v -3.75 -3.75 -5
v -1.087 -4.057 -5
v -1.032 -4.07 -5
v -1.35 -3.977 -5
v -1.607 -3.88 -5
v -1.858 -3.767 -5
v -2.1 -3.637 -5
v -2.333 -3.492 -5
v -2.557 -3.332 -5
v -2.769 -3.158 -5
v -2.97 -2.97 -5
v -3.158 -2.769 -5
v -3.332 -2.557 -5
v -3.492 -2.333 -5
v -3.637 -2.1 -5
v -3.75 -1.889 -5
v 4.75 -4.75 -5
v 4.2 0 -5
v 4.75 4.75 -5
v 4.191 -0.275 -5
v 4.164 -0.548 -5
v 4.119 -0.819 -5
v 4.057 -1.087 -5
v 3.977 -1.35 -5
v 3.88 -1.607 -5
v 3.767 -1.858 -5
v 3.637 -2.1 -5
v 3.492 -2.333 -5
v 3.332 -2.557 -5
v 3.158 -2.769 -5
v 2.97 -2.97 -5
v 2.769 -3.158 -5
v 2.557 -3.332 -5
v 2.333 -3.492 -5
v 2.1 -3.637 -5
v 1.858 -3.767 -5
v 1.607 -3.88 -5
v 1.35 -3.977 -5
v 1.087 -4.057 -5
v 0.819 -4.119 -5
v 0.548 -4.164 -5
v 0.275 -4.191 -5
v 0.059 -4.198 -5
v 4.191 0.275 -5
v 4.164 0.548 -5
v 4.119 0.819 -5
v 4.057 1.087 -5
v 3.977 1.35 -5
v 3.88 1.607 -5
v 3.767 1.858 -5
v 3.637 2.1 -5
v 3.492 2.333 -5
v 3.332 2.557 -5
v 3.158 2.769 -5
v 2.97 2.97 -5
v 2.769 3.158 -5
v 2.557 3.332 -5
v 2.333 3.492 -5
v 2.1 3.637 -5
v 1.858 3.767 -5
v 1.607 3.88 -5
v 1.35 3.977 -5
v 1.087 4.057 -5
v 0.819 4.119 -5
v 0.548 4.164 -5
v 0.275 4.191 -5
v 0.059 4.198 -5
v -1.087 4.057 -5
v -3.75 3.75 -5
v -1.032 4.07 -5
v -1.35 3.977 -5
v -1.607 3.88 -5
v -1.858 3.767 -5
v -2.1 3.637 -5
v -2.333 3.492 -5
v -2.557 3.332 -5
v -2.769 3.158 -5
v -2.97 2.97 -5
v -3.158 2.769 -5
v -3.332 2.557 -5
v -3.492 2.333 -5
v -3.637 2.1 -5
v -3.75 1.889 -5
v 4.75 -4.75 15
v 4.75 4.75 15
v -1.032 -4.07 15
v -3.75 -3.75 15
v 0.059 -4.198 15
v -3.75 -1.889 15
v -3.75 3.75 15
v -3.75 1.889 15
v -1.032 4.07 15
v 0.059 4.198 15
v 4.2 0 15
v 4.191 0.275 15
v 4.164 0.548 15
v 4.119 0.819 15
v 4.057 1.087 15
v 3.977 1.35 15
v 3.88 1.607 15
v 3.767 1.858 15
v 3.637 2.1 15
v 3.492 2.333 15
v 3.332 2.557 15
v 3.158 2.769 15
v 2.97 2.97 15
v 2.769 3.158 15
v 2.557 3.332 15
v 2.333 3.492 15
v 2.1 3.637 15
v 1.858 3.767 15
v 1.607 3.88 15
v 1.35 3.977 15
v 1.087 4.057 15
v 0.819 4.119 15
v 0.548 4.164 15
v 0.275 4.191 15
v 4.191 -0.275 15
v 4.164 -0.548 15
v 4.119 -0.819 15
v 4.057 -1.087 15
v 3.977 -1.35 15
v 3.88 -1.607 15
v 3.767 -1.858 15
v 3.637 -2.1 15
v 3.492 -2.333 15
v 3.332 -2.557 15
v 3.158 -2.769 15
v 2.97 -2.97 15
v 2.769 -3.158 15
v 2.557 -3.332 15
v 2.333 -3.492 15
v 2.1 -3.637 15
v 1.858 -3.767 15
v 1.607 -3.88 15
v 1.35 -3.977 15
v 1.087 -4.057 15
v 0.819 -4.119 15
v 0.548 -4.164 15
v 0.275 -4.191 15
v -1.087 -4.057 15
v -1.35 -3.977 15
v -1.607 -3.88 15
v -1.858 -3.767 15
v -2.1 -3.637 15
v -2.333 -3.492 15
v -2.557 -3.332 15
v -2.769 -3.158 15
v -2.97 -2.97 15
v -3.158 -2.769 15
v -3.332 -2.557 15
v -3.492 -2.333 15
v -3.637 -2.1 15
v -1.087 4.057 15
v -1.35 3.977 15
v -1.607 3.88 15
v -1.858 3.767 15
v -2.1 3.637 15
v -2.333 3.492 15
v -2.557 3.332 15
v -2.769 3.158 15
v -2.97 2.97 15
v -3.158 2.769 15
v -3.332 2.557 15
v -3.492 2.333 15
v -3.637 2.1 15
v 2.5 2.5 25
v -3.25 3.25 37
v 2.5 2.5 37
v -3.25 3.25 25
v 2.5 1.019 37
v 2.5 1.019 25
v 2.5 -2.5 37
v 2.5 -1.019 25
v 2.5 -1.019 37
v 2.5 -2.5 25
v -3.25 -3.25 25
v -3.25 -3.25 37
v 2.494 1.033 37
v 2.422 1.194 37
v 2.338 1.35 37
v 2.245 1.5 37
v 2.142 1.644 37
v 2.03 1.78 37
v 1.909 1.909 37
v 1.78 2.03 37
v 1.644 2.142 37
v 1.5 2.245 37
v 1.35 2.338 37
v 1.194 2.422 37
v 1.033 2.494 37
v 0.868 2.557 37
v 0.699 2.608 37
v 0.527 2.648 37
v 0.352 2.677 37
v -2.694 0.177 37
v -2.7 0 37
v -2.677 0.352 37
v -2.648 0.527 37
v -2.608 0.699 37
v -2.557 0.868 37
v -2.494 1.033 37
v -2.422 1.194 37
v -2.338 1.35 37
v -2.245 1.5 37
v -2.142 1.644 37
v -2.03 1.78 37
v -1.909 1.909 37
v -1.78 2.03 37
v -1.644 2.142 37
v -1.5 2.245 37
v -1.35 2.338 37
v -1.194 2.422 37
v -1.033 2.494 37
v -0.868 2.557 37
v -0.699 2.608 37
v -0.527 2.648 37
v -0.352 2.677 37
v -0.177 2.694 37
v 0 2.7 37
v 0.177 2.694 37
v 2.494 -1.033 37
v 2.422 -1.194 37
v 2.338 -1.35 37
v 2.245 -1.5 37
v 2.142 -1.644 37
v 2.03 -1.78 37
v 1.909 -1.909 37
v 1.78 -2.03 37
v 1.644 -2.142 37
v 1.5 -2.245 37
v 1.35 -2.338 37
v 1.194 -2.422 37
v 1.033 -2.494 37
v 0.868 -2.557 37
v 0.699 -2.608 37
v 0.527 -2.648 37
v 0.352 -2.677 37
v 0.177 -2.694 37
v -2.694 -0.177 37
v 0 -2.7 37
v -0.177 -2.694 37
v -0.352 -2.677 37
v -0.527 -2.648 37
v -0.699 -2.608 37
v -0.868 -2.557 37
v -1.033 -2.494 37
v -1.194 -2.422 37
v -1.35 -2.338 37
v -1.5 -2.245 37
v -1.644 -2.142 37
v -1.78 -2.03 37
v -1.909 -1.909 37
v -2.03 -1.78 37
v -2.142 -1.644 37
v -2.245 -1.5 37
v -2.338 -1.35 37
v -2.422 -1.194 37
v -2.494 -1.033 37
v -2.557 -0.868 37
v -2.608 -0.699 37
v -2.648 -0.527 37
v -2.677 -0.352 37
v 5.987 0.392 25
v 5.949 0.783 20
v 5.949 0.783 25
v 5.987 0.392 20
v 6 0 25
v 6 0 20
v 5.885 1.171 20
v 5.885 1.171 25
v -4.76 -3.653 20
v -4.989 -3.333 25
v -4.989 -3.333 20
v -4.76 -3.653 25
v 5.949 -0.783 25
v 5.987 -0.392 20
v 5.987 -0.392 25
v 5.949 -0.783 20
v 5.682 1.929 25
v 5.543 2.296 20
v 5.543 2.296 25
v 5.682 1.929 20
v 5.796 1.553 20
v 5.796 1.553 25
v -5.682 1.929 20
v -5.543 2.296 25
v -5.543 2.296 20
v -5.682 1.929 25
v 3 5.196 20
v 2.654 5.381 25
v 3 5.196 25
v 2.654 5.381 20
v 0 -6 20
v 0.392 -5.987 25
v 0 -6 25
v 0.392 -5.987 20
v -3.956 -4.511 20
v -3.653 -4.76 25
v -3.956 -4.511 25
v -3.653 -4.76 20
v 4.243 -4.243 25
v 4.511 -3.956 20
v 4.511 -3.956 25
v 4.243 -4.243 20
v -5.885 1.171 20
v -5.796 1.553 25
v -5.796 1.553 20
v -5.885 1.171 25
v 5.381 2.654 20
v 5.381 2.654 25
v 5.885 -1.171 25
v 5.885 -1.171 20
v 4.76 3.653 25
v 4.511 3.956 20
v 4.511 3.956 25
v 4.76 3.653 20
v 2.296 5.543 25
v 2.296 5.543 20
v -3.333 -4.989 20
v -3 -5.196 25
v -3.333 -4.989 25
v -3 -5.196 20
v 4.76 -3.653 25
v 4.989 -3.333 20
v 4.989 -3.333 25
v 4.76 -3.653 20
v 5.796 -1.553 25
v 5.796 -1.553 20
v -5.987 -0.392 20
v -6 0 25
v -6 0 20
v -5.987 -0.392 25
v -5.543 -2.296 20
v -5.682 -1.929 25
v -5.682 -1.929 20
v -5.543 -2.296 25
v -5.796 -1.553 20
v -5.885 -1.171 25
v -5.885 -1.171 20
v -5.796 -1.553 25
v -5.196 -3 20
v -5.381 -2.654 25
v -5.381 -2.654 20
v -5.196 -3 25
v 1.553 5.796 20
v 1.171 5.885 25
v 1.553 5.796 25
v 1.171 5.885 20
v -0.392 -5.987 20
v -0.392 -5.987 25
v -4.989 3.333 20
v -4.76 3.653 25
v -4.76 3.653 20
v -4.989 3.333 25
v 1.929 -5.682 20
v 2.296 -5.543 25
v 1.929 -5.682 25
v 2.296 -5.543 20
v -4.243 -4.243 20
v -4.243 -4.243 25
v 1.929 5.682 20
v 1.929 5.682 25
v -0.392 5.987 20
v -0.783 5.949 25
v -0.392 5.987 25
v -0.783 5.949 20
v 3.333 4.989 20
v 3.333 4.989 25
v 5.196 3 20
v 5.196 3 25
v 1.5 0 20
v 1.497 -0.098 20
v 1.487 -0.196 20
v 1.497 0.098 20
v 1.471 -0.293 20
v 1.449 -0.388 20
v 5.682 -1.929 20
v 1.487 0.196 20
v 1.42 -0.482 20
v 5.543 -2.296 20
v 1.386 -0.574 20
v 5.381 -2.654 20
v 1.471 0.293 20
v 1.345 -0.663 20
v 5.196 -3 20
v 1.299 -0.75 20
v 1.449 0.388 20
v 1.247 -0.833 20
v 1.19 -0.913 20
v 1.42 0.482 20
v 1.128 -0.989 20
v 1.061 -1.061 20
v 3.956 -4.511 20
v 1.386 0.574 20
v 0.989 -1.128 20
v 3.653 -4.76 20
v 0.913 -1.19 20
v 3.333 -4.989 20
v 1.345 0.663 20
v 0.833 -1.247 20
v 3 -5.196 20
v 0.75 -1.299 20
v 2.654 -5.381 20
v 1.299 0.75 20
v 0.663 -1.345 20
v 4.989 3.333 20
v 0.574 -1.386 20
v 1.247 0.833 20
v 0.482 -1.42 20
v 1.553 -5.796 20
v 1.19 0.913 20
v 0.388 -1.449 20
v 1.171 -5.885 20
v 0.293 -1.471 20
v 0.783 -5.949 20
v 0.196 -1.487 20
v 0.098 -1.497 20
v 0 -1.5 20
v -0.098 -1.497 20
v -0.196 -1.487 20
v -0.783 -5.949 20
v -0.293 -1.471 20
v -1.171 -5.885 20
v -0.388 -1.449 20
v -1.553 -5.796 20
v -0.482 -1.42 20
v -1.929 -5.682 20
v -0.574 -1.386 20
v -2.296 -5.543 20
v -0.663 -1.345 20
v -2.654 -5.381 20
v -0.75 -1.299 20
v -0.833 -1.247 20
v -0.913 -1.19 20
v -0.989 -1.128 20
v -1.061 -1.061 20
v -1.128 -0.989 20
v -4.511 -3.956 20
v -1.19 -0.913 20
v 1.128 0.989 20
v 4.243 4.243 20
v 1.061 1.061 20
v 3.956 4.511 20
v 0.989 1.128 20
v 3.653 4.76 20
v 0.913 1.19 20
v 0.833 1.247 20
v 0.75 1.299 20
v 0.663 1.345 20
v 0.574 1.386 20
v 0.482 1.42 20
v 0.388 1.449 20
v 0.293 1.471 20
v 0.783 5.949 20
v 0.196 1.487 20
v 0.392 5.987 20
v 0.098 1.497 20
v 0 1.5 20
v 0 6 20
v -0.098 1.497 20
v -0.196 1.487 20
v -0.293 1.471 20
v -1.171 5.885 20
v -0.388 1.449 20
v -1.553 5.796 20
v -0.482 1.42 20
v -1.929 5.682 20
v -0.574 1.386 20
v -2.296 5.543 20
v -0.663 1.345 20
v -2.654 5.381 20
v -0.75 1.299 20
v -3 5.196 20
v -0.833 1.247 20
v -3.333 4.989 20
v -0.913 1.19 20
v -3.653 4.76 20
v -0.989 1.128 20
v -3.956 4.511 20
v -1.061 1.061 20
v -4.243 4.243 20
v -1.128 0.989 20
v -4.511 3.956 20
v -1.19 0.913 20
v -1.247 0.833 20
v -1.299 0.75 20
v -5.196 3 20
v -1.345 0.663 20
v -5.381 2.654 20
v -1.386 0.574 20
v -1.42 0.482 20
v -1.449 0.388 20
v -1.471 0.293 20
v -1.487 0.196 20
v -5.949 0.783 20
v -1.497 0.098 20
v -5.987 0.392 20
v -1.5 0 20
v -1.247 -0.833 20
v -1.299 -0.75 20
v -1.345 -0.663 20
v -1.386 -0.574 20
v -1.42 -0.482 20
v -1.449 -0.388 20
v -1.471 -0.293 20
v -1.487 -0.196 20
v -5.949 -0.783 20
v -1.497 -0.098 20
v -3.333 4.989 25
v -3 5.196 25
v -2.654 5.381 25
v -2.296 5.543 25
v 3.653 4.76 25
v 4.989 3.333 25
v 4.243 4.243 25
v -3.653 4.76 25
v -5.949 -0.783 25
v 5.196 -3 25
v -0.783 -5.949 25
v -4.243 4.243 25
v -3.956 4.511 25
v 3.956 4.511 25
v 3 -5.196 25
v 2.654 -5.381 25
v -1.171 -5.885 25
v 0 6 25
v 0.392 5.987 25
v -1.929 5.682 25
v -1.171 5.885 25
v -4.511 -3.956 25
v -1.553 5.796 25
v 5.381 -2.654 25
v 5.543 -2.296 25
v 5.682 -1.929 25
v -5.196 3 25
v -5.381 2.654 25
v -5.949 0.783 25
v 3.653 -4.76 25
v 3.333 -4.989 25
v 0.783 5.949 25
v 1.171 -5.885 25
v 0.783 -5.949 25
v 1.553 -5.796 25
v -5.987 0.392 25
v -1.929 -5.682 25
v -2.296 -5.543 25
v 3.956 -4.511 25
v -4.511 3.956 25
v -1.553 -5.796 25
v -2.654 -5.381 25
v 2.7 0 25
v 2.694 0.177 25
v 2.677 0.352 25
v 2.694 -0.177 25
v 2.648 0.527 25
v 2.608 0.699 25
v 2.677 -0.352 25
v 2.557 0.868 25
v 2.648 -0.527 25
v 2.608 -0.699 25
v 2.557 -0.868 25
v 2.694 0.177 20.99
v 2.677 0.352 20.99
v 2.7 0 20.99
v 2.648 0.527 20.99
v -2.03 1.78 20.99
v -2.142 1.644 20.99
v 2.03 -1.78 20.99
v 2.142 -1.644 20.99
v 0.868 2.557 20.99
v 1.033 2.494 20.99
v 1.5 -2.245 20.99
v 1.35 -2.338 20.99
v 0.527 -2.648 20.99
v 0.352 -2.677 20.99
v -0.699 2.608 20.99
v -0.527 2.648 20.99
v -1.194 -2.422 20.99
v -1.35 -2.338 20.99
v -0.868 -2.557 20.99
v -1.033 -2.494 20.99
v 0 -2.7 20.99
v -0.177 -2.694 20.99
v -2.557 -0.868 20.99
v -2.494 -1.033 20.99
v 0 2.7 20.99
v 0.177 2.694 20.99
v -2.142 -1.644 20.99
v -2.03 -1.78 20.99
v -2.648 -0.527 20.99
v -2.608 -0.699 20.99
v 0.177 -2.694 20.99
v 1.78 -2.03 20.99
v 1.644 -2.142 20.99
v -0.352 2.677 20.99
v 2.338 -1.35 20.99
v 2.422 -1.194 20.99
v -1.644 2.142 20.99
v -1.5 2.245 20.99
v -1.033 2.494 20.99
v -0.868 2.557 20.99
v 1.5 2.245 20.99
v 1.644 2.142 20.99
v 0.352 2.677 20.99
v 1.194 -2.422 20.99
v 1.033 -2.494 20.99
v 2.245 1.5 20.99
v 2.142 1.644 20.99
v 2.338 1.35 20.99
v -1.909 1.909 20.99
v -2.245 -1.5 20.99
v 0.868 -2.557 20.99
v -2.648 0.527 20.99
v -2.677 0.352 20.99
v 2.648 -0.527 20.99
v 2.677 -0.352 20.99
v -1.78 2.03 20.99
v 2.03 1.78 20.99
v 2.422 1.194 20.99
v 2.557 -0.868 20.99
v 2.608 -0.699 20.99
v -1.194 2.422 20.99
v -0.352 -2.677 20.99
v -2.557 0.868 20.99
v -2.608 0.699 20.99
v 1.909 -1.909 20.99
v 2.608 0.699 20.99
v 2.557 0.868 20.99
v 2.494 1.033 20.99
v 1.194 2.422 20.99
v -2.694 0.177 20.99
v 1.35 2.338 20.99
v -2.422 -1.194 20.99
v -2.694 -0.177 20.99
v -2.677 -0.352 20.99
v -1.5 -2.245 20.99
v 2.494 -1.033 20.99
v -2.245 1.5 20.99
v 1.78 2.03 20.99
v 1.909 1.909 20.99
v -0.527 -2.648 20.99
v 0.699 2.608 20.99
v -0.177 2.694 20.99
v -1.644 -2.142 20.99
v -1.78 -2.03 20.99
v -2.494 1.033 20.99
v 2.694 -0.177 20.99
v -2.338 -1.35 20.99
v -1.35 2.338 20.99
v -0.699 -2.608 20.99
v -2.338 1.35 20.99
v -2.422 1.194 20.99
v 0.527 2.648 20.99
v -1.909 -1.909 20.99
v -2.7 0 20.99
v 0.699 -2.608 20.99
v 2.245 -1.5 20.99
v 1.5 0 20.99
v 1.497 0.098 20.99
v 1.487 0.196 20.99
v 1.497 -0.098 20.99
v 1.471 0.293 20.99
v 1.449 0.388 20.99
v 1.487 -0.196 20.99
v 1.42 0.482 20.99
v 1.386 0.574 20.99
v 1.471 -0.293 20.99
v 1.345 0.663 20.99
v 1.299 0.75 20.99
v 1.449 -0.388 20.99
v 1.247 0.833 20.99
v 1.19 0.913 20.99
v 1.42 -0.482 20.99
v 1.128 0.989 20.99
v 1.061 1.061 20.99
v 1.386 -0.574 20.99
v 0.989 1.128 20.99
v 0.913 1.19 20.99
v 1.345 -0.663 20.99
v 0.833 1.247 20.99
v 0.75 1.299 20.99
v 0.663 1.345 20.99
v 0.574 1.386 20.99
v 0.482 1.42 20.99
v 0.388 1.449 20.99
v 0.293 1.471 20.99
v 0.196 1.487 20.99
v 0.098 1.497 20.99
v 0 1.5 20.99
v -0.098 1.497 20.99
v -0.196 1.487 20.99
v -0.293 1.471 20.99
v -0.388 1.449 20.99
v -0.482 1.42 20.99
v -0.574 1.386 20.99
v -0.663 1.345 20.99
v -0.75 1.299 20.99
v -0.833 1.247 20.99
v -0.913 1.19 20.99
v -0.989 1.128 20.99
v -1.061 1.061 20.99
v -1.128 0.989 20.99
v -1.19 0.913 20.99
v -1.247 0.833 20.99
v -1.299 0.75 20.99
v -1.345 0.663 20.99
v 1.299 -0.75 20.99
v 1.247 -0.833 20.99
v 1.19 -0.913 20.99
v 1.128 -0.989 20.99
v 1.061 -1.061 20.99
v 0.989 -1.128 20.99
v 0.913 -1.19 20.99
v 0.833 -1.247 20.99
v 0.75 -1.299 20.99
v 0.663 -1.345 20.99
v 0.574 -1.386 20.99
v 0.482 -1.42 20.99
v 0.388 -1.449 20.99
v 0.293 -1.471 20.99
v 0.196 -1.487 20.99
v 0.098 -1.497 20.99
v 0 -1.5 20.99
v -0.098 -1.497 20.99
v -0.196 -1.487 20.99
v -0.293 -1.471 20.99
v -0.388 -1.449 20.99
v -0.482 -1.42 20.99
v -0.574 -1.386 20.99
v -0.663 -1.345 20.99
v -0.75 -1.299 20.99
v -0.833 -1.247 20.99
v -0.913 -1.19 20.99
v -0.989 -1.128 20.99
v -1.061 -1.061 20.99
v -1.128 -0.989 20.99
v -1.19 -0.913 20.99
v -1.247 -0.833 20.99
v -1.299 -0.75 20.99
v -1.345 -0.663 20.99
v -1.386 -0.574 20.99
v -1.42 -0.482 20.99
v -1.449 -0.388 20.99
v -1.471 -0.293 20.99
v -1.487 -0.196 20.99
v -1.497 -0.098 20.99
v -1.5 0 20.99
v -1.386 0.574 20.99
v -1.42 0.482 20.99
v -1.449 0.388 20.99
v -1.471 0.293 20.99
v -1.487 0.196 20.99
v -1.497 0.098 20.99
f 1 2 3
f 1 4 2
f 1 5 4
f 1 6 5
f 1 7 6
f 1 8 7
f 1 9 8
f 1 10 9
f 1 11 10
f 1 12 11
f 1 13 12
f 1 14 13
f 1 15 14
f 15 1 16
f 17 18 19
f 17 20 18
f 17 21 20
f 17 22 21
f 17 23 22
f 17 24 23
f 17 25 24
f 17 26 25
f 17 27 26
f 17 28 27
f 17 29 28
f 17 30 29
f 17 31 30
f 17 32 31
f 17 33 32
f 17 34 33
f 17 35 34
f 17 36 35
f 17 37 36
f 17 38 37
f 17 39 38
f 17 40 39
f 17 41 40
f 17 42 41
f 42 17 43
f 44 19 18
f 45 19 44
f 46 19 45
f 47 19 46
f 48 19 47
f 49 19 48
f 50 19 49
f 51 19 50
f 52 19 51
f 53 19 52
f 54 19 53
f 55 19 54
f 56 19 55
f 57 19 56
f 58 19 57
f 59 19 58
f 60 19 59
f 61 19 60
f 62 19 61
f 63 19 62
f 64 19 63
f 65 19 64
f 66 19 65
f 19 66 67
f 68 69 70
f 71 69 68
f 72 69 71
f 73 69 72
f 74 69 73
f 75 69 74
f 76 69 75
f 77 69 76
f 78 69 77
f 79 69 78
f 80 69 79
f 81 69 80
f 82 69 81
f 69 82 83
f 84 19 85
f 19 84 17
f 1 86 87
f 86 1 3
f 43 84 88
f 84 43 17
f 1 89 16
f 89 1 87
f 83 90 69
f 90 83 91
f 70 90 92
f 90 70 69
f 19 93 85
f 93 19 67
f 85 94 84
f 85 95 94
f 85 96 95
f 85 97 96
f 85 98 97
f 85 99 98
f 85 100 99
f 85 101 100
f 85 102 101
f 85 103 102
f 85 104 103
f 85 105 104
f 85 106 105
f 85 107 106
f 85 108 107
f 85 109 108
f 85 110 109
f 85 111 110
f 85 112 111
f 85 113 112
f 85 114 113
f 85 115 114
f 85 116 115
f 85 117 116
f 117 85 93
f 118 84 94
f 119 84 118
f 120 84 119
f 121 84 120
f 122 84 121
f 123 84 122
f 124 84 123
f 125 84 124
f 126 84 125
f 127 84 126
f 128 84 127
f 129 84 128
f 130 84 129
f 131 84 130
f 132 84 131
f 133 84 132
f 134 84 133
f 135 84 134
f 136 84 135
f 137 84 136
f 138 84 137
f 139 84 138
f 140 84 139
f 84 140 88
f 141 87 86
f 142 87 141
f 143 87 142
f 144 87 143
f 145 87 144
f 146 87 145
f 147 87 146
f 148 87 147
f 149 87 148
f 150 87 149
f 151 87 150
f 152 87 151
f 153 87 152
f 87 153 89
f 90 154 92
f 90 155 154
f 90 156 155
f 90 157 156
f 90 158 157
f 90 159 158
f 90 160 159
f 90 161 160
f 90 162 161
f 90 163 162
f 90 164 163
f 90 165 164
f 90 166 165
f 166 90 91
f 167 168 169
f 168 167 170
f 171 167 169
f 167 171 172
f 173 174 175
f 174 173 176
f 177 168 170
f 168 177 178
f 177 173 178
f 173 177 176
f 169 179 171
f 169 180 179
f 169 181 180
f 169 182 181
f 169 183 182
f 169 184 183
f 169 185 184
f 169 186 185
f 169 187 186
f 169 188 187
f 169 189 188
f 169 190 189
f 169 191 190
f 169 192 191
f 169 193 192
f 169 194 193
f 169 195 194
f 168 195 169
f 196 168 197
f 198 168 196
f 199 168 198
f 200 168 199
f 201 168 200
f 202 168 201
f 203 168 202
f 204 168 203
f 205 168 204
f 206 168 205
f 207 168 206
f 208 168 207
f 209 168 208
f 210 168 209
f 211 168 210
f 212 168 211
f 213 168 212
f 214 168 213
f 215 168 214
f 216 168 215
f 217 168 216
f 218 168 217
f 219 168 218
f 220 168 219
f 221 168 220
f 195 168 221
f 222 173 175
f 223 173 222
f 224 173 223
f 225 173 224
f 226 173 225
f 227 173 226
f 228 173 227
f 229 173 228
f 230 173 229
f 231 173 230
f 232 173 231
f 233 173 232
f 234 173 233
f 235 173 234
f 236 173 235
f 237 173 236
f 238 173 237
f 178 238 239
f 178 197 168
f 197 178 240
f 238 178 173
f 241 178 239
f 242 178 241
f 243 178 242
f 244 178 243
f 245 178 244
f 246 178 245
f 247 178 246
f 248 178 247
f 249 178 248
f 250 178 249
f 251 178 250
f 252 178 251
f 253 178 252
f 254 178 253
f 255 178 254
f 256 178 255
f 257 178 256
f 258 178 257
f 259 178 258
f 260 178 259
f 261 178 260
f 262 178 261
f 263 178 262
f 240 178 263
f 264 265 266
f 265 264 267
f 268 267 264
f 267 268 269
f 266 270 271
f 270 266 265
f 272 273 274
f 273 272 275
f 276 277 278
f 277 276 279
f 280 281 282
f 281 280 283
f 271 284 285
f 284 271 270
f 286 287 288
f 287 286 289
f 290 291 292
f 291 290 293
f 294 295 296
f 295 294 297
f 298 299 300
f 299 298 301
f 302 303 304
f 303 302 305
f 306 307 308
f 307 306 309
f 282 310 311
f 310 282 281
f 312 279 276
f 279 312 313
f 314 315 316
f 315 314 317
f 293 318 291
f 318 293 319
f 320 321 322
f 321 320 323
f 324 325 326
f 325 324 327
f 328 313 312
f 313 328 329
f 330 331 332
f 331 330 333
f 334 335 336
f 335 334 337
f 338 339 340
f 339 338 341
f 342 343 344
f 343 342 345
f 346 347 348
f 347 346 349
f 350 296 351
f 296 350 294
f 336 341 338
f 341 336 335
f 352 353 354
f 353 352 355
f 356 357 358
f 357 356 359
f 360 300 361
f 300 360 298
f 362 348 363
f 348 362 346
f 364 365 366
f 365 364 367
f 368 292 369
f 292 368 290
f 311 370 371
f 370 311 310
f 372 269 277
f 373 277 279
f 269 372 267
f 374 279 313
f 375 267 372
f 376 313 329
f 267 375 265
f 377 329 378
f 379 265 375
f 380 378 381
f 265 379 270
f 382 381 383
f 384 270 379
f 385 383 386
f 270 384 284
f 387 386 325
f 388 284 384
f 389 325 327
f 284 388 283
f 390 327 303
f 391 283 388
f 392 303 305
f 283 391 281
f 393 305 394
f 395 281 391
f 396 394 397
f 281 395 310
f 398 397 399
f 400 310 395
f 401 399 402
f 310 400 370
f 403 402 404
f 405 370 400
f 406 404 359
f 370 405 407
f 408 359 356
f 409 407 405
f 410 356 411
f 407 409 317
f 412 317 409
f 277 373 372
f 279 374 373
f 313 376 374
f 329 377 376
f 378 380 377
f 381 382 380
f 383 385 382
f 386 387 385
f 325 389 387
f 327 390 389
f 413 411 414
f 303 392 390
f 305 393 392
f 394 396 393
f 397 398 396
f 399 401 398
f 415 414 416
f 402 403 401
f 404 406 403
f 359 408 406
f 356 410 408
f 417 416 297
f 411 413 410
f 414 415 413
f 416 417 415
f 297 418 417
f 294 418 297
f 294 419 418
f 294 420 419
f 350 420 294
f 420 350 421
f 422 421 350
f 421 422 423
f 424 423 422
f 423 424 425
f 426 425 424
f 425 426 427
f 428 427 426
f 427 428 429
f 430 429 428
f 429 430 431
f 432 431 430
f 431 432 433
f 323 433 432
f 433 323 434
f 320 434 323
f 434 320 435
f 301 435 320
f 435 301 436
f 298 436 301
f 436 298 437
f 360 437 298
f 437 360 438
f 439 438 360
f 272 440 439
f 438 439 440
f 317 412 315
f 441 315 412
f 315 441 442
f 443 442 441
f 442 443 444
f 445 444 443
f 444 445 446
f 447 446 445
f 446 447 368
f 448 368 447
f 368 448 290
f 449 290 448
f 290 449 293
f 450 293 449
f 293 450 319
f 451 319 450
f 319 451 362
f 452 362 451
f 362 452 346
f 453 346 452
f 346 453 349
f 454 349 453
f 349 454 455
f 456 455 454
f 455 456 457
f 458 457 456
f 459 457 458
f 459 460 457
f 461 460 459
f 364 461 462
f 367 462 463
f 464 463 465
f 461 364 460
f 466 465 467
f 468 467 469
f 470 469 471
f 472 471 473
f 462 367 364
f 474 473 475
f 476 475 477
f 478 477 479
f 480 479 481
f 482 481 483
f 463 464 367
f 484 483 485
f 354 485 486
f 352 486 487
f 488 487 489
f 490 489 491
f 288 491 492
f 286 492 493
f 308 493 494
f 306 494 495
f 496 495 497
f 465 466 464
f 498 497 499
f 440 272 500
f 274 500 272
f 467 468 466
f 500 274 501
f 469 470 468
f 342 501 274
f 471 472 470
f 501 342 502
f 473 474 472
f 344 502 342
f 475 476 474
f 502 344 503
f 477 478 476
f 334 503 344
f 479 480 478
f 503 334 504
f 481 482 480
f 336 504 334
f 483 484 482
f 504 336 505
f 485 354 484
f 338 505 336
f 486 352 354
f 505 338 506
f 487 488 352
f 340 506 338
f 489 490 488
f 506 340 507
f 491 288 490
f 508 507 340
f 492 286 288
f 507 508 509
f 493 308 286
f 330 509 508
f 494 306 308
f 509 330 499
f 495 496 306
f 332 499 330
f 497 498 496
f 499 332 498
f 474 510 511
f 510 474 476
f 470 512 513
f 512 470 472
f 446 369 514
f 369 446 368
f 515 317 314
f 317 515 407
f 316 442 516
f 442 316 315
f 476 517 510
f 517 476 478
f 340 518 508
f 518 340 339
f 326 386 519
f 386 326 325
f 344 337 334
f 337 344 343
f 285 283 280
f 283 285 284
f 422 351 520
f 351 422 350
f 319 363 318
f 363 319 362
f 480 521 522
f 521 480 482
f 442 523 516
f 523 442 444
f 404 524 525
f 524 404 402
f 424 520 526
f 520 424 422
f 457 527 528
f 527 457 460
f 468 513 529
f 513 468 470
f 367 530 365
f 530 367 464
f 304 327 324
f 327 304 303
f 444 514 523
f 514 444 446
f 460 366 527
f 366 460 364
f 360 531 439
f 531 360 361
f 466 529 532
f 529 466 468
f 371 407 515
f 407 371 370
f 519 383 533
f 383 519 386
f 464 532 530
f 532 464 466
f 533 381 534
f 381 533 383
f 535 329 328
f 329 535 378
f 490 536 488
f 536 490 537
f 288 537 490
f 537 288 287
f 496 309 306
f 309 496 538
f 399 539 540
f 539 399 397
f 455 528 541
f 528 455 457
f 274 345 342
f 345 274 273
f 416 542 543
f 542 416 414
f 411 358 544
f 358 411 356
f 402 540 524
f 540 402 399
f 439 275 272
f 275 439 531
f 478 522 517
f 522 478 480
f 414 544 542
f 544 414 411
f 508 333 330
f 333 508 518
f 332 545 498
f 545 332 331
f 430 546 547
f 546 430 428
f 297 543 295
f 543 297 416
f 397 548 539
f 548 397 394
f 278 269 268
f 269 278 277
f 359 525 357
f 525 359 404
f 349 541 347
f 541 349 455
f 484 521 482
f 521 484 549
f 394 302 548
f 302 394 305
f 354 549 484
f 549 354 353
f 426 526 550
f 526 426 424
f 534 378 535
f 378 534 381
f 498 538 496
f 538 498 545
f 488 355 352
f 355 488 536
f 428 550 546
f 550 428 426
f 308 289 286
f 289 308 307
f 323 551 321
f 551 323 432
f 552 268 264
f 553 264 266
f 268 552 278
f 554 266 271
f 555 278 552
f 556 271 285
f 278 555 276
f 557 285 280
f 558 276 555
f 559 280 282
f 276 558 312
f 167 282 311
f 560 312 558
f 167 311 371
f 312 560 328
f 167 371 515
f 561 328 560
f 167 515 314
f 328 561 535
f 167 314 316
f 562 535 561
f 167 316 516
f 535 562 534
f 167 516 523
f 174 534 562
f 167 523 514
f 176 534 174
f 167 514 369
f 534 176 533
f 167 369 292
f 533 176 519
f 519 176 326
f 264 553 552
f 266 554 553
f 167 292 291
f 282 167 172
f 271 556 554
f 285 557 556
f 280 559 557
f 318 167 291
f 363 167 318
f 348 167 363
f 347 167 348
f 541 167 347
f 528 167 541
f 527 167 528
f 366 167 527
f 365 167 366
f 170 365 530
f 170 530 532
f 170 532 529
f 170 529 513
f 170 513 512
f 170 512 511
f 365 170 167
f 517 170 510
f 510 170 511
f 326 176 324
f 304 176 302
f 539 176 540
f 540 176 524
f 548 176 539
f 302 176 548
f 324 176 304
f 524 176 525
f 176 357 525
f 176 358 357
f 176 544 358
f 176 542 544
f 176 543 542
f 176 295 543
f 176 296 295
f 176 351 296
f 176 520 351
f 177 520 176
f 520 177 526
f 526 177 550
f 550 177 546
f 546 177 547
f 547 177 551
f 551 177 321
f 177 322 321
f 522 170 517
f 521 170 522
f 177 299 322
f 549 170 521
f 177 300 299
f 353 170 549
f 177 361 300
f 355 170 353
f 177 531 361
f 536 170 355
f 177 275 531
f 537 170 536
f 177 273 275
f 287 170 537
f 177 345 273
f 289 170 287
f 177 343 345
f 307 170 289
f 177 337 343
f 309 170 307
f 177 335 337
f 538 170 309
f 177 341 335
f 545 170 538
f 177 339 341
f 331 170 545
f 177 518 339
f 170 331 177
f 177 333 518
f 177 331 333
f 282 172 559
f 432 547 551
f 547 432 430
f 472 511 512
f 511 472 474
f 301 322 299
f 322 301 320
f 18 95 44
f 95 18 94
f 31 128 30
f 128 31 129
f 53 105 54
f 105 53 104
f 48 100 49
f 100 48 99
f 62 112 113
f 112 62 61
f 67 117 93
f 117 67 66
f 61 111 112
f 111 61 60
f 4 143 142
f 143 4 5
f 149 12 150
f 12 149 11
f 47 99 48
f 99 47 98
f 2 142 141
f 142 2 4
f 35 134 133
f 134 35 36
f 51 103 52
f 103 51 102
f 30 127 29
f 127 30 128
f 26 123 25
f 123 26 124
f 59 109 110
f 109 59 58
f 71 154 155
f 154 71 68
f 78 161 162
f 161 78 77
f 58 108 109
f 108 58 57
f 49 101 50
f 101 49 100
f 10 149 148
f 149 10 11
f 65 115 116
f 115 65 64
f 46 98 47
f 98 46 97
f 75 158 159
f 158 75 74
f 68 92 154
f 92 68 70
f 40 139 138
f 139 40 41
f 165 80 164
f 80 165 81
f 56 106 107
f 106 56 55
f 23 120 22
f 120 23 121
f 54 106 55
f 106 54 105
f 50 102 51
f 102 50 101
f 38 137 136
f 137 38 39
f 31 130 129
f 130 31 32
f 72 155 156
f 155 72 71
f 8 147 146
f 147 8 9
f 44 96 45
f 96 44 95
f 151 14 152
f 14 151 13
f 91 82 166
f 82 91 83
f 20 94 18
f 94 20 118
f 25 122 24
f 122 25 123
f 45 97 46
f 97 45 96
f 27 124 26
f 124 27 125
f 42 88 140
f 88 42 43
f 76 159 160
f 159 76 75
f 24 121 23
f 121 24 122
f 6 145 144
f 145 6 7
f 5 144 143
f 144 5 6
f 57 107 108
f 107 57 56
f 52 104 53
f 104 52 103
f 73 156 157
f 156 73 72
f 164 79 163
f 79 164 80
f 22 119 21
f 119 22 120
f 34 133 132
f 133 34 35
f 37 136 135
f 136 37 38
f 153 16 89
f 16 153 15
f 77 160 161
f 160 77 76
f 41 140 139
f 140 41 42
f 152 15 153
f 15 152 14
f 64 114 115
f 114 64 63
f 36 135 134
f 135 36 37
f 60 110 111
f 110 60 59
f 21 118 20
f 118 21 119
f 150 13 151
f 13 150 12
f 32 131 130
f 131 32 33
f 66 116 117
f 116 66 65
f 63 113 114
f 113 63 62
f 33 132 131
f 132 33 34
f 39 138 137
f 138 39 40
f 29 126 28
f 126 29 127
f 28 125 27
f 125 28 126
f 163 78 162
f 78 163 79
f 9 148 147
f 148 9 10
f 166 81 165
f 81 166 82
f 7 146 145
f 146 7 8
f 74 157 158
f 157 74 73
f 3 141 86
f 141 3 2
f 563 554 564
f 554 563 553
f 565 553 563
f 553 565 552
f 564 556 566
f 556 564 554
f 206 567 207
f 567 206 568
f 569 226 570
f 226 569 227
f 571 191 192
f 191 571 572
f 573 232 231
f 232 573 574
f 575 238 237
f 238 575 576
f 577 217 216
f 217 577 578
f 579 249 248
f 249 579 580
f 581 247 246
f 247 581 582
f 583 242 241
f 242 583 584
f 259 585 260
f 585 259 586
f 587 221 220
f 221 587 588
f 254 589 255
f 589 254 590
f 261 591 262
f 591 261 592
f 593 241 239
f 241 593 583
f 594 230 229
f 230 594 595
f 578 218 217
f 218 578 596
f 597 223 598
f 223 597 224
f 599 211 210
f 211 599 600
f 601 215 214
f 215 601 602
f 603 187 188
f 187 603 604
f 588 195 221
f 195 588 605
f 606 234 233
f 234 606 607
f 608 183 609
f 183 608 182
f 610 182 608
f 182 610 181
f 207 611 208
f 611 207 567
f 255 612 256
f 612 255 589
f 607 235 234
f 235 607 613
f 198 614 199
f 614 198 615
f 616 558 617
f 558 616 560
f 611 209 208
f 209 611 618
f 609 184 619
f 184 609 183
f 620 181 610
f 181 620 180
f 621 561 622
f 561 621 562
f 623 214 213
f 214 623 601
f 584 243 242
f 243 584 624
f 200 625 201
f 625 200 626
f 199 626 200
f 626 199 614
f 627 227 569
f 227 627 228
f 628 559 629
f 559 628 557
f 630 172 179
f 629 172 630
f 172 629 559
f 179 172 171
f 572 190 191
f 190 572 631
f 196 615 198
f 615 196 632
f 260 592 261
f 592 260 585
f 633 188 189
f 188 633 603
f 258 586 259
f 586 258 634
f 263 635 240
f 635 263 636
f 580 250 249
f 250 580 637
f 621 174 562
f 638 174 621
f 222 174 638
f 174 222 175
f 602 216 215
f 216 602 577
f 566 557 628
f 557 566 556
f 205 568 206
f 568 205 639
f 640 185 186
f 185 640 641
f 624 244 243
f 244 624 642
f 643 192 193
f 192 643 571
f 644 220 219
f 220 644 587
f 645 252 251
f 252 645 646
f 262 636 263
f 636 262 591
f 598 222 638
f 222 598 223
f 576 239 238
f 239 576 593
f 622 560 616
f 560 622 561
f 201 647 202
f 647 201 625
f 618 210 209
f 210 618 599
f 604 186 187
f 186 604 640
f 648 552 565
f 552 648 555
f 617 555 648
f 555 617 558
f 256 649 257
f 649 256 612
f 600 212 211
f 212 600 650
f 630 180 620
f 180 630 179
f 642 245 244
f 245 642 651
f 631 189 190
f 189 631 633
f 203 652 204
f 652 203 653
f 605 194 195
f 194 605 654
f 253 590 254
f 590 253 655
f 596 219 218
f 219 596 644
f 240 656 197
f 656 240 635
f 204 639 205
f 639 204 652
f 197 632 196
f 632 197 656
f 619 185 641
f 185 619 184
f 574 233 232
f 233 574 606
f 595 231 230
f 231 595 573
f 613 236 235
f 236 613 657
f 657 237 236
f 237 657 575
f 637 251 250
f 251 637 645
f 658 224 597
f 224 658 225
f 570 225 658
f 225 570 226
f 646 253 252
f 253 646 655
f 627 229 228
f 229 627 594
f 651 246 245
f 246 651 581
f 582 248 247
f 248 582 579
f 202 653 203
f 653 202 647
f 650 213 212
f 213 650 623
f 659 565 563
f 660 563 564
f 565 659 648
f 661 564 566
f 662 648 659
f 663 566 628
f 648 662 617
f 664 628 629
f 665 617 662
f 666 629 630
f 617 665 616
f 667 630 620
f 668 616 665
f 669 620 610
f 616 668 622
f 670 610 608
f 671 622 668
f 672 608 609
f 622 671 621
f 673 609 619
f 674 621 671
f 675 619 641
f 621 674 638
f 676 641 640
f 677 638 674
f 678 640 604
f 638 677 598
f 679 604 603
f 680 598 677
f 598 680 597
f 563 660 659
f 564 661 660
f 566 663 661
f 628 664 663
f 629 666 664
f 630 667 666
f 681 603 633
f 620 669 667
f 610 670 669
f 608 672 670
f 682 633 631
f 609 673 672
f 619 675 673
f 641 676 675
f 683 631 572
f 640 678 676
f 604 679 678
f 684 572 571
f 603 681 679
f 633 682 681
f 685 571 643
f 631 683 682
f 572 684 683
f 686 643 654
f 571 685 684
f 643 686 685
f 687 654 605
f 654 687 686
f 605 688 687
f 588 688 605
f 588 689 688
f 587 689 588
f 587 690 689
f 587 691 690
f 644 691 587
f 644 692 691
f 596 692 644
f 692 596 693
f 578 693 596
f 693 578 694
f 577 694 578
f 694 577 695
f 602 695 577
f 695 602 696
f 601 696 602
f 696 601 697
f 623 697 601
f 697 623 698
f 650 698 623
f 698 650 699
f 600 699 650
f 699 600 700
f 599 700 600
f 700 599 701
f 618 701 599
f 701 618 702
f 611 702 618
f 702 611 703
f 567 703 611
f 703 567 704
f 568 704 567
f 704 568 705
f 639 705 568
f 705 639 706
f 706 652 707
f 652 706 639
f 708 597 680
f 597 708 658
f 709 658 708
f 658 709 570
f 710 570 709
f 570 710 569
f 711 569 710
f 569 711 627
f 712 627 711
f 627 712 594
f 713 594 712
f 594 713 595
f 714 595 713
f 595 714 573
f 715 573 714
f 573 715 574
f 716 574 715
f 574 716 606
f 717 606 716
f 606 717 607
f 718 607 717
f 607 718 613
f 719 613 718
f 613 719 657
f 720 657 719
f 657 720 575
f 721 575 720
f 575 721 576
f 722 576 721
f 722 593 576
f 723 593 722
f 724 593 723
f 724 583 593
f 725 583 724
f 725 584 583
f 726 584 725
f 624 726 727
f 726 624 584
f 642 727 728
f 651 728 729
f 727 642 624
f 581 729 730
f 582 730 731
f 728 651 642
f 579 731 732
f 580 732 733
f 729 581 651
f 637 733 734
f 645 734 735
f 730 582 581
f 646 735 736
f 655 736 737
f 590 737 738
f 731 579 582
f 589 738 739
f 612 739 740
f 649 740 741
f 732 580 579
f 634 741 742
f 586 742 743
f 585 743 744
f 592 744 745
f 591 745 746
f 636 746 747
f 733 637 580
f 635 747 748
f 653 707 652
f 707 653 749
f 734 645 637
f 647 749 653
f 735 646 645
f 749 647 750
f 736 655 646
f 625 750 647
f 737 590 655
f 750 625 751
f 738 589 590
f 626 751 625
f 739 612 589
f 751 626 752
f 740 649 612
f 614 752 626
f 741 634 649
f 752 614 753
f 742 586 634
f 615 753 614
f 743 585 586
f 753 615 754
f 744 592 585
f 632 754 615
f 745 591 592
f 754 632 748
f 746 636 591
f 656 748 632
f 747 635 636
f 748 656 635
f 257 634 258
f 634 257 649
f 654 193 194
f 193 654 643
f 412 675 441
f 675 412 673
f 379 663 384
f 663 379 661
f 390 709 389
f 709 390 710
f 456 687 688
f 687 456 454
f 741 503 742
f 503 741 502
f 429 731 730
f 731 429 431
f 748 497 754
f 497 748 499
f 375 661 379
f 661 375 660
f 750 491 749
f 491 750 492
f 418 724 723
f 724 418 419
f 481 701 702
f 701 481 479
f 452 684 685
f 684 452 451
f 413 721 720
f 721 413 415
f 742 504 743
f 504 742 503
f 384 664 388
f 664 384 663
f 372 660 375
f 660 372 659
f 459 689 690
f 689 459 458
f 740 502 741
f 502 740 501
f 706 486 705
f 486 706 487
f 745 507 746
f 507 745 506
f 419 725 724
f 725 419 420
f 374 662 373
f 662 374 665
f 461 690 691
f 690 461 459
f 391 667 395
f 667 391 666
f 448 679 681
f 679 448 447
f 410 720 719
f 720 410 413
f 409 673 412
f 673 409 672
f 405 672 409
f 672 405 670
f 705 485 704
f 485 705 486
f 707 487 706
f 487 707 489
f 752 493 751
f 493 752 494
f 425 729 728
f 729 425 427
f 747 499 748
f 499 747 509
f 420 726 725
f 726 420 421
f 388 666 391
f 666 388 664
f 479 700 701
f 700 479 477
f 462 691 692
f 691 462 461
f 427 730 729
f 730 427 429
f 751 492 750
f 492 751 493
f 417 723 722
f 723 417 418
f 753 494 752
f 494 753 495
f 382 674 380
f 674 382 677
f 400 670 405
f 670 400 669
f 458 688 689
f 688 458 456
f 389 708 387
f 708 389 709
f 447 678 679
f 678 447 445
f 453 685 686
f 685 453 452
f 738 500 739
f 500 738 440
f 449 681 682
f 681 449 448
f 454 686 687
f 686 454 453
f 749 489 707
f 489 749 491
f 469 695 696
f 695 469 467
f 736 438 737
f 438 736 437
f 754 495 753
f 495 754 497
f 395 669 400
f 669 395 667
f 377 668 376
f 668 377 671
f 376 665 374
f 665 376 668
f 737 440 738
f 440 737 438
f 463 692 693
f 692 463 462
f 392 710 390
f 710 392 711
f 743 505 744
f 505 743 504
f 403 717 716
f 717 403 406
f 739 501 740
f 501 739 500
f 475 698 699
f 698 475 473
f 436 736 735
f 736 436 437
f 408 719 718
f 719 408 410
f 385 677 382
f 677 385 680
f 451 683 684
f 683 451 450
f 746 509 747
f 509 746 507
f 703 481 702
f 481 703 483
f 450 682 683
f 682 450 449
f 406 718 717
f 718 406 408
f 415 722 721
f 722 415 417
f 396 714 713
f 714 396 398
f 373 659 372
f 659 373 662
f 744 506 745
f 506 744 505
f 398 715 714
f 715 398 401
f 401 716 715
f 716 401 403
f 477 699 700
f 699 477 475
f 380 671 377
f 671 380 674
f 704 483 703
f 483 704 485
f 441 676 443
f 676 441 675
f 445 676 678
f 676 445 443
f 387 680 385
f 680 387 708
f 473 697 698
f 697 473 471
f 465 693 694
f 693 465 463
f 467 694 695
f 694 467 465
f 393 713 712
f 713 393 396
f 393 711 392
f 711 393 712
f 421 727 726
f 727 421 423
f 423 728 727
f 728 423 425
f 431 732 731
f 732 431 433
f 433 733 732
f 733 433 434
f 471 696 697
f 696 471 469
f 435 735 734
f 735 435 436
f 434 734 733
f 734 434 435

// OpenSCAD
// Hose-barb reducer: joins 8 mm and 5 mm silicone tubing
// Print orientation: standing upright along +Z

// ---------- Parameters ----------
t8_d      = 8;     // 8 mm tubing inner diameter
t5_d      = 5;     // 5 mm tubing inner diameter
bore_d    = 3;     // through-bore diameter
z0        = 0;     // start of 8 mm section
z1        = 20;    // start of collar
z2        = 25;    // start of 5 mm section
z3        = 41;    // end of part
barb_h8   = 10;    // 8 mm barb height
barb_h5   = 8;     // 5 mm barb height
od8_bot   = 7.5;   // 8 mm barb outer diameter at bottom
od8_top   = 9.5;   // 8 mm barb outer diameter at top
od5_bot   = 6.5;   // 5 mm barb outer diameter at bottom
od5_top   = 5.0;   // 5 mm barb outer diameter at top
collar_d  = 12;    // collar diameter
eps       = 0.5;   // cutter overshoot

$fn = 96;

// ---------- Model ----------
difference() {
    union() {
        // 8 mm section (z = 0..20): two stacked sawtooth barbs
        for (s = [-1, 1])
            translate([0, 0, z0 + s * barb_h8 / 2])
                linear_extrude(barb_h8)
                    polygon([[-od8_bot / 2, -od8_bot / 2],
                             [-od8_bot / 2, od8_bot / 2],
                             [od8_top / 2, od8_top / 2],
                             [od8_top / 2, -od8_top / 2]]);

        // Collar (z = 20..25)
        translate([0, 0, z1])
            cylinder(d = collar_d, h = z2 - z1);

        // 5 mm section (z = 25..41): two stacked sawtooth barbs
        for (s = [-1, 1])
            translate([0, 0, z2 + s * barb_h5 / 2])
                linear_extrude(barb_h5)
                    polygon([[-od5_bot / 2, -od5_bot / 2],
                             [-od5_bot / 2, od5_bot / 2],
                             [od5_top / 2, od5_top / 2],
                             [od5_top / 2, -od5_top / 2]]);
    }

    // Cutters
    translate([0, 0, -eps])
        cylinder(d = bore_d, h = z3 - z0 + 2 * eps);

    for (s = [-1, 1]) {
        // 8 mm tubing cutters
        translate([0, 0, z0 + s * barb_h8 / 2 - 0.01])
            cylinder(d = t8_d + 0.4, h = barb_h8 + 0.02);
        // 5 mm tubing cutters
        translate([0, 0, z2 + s * barb_h5 / 2 - 0.01])
            cylinder(d = t5_d + 0.4, h = barb_h5 + 0.02);
    }
}
